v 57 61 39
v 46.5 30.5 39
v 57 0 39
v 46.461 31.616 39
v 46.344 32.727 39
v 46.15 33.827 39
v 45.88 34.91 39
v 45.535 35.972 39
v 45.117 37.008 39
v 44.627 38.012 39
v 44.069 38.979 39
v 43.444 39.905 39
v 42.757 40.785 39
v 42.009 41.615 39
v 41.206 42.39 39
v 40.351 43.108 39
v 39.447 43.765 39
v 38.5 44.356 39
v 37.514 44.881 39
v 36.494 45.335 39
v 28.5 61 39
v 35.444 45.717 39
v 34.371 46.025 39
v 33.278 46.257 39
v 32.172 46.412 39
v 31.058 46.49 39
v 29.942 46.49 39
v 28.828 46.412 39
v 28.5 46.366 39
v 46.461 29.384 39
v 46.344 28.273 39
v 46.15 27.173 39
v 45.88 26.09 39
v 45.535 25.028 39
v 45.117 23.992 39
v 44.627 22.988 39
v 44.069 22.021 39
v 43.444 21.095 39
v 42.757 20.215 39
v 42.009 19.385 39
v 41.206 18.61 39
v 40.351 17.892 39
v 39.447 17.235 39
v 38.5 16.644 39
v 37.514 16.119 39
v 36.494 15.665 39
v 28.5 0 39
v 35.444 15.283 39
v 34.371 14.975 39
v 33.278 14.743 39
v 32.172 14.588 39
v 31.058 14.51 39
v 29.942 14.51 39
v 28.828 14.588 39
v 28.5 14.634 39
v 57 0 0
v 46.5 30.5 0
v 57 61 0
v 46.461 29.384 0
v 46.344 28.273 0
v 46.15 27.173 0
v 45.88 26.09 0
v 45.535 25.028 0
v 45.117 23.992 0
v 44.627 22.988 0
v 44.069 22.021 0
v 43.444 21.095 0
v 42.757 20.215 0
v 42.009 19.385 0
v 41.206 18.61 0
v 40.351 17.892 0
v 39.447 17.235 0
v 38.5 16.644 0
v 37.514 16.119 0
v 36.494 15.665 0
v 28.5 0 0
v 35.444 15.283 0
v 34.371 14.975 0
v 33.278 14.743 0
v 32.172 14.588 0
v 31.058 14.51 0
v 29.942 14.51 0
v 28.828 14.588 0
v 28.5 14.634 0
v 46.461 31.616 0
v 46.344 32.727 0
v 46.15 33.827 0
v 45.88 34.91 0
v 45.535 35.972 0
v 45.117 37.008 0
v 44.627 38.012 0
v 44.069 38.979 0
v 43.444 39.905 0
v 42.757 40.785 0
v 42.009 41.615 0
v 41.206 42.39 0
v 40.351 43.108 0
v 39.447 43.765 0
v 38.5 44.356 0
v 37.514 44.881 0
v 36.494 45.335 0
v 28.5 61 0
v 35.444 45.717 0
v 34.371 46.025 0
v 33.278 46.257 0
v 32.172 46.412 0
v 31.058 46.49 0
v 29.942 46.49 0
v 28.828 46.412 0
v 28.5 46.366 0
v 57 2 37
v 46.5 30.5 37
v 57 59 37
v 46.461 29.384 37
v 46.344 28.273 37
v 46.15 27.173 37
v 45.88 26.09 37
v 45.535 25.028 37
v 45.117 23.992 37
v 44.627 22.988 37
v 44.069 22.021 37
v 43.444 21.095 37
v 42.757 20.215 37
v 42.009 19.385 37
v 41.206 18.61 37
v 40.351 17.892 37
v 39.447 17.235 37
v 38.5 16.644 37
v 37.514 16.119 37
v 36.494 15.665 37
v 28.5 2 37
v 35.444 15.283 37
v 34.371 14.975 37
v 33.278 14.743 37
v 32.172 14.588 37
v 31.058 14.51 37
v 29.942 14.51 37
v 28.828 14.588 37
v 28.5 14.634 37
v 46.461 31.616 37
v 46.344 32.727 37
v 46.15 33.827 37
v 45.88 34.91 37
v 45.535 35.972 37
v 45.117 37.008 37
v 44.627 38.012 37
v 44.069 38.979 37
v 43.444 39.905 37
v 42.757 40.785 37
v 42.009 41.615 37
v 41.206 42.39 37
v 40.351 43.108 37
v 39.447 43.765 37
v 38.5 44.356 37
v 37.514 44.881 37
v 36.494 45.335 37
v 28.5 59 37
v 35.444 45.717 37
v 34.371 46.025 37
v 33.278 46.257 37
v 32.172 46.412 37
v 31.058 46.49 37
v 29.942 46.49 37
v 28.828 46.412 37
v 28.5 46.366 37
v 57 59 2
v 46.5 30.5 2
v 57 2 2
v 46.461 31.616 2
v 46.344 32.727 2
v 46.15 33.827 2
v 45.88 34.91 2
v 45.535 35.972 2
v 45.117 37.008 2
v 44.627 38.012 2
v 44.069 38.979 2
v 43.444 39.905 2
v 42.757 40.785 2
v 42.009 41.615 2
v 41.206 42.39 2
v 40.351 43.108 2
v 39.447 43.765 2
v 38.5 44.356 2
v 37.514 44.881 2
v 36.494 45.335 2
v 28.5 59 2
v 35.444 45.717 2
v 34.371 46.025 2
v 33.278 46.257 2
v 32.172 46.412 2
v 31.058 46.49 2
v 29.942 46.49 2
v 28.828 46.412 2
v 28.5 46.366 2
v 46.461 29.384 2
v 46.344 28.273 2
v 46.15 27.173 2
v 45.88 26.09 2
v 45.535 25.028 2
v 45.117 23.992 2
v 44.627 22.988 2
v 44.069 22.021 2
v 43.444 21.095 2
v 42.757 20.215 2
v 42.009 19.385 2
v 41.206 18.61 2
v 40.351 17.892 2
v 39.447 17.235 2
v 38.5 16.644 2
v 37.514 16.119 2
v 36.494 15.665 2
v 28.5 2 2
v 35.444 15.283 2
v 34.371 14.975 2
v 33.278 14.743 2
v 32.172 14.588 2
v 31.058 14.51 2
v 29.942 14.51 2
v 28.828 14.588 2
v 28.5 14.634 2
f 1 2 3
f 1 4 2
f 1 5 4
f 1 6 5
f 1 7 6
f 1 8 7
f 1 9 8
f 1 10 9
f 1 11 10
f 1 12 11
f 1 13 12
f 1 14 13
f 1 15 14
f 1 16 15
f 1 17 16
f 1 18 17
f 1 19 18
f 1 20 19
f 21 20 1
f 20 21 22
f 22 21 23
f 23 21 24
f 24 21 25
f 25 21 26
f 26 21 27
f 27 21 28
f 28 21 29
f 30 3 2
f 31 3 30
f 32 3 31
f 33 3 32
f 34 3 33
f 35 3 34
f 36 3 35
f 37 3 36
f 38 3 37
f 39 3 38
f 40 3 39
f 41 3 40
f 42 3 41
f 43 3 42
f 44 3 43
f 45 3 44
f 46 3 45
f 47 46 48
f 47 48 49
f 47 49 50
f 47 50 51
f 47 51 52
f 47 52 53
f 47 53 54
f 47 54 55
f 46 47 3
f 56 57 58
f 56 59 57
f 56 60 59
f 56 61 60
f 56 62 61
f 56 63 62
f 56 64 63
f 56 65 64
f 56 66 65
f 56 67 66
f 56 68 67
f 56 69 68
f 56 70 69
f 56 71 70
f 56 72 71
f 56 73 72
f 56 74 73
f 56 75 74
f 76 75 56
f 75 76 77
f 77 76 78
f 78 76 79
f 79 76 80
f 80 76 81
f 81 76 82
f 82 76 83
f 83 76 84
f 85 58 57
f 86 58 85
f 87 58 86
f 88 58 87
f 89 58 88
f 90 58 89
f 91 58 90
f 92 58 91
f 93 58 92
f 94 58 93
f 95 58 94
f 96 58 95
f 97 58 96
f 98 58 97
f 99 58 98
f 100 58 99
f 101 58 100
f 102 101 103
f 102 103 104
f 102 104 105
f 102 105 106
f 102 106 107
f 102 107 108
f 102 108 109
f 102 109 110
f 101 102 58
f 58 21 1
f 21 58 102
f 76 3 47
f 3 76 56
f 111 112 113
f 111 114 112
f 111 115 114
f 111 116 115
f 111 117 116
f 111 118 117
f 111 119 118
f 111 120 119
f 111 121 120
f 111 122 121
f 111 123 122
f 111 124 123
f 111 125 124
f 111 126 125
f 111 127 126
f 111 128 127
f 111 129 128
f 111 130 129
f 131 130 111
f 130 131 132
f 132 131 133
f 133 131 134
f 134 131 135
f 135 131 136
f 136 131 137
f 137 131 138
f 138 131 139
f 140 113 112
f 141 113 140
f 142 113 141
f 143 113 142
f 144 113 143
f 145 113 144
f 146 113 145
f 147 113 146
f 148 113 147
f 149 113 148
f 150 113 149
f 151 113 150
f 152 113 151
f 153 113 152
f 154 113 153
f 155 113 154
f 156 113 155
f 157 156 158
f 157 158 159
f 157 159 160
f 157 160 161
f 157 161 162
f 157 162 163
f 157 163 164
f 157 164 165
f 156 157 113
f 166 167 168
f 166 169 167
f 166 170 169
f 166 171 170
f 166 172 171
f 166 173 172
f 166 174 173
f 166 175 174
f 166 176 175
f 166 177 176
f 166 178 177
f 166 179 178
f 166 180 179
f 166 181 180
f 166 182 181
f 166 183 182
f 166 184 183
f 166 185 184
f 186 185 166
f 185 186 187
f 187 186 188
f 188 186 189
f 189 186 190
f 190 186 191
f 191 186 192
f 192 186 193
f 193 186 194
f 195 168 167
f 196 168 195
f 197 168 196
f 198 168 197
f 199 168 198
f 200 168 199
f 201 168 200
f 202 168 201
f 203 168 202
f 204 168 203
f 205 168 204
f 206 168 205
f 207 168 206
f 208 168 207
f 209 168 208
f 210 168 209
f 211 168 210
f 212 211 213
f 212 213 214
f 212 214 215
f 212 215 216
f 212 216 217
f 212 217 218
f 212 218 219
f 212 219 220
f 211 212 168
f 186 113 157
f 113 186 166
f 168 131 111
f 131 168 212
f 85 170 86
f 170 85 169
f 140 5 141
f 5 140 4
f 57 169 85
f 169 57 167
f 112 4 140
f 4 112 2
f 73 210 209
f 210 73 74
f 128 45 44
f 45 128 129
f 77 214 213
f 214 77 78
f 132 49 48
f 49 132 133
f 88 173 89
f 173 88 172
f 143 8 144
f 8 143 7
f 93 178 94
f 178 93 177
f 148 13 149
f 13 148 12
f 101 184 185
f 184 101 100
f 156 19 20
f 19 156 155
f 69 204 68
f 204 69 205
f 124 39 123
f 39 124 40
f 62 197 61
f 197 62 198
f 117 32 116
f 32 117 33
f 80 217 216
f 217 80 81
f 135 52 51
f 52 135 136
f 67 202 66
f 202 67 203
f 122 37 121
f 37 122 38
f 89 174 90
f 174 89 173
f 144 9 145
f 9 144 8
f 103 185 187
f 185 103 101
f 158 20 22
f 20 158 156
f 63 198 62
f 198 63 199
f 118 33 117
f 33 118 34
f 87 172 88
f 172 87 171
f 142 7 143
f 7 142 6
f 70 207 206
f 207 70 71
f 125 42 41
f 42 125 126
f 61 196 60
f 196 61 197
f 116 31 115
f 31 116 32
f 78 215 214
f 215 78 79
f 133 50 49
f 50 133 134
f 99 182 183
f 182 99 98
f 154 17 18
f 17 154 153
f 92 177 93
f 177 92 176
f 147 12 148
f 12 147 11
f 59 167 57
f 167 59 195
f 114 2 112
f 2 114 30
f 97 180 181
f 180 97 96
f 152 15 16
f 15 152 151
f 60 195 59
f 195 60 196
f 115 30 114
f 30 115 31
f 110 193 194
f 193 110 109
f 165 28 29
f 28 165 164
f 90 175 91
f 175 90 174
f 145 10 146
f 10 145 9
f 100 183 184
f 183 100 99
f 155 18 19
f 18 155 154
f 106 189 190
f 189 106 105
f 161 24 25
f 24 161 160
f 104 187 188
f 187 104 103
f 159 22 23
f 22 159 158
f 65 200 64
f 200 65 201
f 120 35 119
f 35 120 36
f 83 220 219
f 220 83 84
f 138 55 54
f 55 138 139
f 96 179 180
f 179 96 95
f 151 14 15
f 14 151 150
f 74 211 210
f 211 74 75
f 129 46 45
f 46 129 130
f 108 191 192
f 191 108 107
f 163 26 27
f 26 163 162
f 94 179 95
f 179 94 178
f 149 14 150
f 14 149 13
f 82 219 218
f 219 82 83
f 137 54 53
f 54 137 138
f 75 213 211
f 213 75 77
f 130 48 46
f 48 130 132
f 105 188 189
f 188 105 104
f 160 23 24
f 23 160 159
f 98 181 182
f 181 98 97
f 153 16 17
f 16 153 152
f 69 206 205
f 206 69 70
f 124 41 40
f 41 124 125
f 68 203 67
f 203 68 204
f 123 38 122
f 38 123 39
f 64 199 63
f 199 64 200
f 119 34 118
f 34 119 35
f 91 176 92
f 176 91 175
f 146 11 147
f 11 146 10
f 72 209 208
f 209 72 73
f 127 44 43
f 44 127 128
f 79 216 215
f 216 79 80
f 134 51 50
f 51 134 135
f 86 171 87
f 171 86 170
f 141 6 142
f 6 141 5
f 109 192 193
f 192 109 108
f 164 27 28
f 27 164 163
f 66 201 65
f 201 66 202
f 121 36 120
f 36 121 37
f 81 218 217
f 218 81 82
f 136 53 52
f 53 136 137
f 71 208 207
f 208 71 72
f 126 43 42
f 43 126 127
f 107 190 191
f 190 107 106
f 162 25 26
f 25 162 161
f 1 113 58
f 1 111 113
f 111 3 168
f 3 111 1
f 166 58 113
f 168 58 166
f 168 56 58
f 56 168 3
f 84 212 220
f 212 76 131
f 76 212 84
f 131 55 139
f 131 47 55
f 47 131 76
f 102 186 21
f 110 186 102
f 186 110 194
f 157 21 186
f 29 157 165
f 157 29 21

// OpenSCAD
// file: dim.scad
M_LED_HOLDER_FRONT	= 164;
M_LED_HOLDER_BACK	= M_LED_HOLDER_FRONT - 10;
M_SWITCH_CENTER		= 147;
M_DOTSTAR			= 135;	// FIXME center mark of first dotstar
M_PORT_CENTER       = 116;
M_TRANSITION		= 102;
M_BUTTRESS_2		= 74;
M_BUTTRESS_1		= 51;
M_BUTTRESS_0		= 33;
M_SPKR_RING			= 15.5;		// Front of the speaker ring.
M_RAIL_START		= 11;
M_POMMEL_FRONT		= 10;		// Where the pommel becomes aft
M_POMMEL_BACK		= -12.5;	// Back of the pommel
M_0					= 0;
M_WAY_BACK			= -20;

H_FAR				= 200;

MM_TO_INCHES = 1 / 25.4;
INCHES_TO_MM = 25.4;

D_FORWARD			= 25.4;
R_FORWARD 			= D_FORWARD / 2;
D_AFT				= 31.8;
R_AFT 				= D_AFT / 2;
T_TRANSITION_RING	= 2;

Y_SWITCH			= 9.6;
D_SWITCH			= 12.5;
D_SWITCH_TOP		= 14.5;
D_PORT 				= 0.5 * INCHES_TO_MM;
D_SMALL_PORT		= 7.6;	// 7.7 tight

D_SABER_OUTER		= 37.5;

X_DOTSTAR           = 5.0;  // from spec
Y_DOTSTAR           = 1.4;  // from spec
DOTSTAR_SPACE		= 7;

H_BUTTRESS			= 3;

H_BATTERY           = 68;
D_BATTERY           = 18.50 + 0.5;    // An 1850. Huh. 
R_BATTERY			= D_BATTERY / 2;

H_SPKR_METAL   		= 8;
D_SPKR_METAL   		= 23.6;	
H_SPKR_PLASTIC 		= 2.7;
D_SPKR_PLASTIC 		= 28;
D_POMMEL			= 31.5;
D_AFT_RING			= 33.5;

RAIL_ANGLE_0		= 90;
RAIL_ANGLE_1		= -90;
W_RAIL				= 3;
RAIL_OUTER_NOTCH	= 2;
RAIL_INNER_NOTCH	= 1;
// main file
include <dim.scad>
$fn = 90;

D_OUTER = 37;
D_INNER = 32;
D = D_INNER;

L = 35;
W = D_OUTER + 20;
T = 2;
H = D_OUTER + 20;


intersection() {
    
    translate([H/2, 0, 0]) cube(size=[H/2, 200, 200]);
    //cube(size=[H/2, 200, 200]);
    
    difference()
    {
        cube(size=[H + T, W + T*2, L + T*2]);
        translate([T, T, T]) {
            cube(size=[200, W, L]);
        }
        translate([H/2 + 2, W/2 + T, -1]) {
            cylinder(h=200, d=D);
        }
    }
}
